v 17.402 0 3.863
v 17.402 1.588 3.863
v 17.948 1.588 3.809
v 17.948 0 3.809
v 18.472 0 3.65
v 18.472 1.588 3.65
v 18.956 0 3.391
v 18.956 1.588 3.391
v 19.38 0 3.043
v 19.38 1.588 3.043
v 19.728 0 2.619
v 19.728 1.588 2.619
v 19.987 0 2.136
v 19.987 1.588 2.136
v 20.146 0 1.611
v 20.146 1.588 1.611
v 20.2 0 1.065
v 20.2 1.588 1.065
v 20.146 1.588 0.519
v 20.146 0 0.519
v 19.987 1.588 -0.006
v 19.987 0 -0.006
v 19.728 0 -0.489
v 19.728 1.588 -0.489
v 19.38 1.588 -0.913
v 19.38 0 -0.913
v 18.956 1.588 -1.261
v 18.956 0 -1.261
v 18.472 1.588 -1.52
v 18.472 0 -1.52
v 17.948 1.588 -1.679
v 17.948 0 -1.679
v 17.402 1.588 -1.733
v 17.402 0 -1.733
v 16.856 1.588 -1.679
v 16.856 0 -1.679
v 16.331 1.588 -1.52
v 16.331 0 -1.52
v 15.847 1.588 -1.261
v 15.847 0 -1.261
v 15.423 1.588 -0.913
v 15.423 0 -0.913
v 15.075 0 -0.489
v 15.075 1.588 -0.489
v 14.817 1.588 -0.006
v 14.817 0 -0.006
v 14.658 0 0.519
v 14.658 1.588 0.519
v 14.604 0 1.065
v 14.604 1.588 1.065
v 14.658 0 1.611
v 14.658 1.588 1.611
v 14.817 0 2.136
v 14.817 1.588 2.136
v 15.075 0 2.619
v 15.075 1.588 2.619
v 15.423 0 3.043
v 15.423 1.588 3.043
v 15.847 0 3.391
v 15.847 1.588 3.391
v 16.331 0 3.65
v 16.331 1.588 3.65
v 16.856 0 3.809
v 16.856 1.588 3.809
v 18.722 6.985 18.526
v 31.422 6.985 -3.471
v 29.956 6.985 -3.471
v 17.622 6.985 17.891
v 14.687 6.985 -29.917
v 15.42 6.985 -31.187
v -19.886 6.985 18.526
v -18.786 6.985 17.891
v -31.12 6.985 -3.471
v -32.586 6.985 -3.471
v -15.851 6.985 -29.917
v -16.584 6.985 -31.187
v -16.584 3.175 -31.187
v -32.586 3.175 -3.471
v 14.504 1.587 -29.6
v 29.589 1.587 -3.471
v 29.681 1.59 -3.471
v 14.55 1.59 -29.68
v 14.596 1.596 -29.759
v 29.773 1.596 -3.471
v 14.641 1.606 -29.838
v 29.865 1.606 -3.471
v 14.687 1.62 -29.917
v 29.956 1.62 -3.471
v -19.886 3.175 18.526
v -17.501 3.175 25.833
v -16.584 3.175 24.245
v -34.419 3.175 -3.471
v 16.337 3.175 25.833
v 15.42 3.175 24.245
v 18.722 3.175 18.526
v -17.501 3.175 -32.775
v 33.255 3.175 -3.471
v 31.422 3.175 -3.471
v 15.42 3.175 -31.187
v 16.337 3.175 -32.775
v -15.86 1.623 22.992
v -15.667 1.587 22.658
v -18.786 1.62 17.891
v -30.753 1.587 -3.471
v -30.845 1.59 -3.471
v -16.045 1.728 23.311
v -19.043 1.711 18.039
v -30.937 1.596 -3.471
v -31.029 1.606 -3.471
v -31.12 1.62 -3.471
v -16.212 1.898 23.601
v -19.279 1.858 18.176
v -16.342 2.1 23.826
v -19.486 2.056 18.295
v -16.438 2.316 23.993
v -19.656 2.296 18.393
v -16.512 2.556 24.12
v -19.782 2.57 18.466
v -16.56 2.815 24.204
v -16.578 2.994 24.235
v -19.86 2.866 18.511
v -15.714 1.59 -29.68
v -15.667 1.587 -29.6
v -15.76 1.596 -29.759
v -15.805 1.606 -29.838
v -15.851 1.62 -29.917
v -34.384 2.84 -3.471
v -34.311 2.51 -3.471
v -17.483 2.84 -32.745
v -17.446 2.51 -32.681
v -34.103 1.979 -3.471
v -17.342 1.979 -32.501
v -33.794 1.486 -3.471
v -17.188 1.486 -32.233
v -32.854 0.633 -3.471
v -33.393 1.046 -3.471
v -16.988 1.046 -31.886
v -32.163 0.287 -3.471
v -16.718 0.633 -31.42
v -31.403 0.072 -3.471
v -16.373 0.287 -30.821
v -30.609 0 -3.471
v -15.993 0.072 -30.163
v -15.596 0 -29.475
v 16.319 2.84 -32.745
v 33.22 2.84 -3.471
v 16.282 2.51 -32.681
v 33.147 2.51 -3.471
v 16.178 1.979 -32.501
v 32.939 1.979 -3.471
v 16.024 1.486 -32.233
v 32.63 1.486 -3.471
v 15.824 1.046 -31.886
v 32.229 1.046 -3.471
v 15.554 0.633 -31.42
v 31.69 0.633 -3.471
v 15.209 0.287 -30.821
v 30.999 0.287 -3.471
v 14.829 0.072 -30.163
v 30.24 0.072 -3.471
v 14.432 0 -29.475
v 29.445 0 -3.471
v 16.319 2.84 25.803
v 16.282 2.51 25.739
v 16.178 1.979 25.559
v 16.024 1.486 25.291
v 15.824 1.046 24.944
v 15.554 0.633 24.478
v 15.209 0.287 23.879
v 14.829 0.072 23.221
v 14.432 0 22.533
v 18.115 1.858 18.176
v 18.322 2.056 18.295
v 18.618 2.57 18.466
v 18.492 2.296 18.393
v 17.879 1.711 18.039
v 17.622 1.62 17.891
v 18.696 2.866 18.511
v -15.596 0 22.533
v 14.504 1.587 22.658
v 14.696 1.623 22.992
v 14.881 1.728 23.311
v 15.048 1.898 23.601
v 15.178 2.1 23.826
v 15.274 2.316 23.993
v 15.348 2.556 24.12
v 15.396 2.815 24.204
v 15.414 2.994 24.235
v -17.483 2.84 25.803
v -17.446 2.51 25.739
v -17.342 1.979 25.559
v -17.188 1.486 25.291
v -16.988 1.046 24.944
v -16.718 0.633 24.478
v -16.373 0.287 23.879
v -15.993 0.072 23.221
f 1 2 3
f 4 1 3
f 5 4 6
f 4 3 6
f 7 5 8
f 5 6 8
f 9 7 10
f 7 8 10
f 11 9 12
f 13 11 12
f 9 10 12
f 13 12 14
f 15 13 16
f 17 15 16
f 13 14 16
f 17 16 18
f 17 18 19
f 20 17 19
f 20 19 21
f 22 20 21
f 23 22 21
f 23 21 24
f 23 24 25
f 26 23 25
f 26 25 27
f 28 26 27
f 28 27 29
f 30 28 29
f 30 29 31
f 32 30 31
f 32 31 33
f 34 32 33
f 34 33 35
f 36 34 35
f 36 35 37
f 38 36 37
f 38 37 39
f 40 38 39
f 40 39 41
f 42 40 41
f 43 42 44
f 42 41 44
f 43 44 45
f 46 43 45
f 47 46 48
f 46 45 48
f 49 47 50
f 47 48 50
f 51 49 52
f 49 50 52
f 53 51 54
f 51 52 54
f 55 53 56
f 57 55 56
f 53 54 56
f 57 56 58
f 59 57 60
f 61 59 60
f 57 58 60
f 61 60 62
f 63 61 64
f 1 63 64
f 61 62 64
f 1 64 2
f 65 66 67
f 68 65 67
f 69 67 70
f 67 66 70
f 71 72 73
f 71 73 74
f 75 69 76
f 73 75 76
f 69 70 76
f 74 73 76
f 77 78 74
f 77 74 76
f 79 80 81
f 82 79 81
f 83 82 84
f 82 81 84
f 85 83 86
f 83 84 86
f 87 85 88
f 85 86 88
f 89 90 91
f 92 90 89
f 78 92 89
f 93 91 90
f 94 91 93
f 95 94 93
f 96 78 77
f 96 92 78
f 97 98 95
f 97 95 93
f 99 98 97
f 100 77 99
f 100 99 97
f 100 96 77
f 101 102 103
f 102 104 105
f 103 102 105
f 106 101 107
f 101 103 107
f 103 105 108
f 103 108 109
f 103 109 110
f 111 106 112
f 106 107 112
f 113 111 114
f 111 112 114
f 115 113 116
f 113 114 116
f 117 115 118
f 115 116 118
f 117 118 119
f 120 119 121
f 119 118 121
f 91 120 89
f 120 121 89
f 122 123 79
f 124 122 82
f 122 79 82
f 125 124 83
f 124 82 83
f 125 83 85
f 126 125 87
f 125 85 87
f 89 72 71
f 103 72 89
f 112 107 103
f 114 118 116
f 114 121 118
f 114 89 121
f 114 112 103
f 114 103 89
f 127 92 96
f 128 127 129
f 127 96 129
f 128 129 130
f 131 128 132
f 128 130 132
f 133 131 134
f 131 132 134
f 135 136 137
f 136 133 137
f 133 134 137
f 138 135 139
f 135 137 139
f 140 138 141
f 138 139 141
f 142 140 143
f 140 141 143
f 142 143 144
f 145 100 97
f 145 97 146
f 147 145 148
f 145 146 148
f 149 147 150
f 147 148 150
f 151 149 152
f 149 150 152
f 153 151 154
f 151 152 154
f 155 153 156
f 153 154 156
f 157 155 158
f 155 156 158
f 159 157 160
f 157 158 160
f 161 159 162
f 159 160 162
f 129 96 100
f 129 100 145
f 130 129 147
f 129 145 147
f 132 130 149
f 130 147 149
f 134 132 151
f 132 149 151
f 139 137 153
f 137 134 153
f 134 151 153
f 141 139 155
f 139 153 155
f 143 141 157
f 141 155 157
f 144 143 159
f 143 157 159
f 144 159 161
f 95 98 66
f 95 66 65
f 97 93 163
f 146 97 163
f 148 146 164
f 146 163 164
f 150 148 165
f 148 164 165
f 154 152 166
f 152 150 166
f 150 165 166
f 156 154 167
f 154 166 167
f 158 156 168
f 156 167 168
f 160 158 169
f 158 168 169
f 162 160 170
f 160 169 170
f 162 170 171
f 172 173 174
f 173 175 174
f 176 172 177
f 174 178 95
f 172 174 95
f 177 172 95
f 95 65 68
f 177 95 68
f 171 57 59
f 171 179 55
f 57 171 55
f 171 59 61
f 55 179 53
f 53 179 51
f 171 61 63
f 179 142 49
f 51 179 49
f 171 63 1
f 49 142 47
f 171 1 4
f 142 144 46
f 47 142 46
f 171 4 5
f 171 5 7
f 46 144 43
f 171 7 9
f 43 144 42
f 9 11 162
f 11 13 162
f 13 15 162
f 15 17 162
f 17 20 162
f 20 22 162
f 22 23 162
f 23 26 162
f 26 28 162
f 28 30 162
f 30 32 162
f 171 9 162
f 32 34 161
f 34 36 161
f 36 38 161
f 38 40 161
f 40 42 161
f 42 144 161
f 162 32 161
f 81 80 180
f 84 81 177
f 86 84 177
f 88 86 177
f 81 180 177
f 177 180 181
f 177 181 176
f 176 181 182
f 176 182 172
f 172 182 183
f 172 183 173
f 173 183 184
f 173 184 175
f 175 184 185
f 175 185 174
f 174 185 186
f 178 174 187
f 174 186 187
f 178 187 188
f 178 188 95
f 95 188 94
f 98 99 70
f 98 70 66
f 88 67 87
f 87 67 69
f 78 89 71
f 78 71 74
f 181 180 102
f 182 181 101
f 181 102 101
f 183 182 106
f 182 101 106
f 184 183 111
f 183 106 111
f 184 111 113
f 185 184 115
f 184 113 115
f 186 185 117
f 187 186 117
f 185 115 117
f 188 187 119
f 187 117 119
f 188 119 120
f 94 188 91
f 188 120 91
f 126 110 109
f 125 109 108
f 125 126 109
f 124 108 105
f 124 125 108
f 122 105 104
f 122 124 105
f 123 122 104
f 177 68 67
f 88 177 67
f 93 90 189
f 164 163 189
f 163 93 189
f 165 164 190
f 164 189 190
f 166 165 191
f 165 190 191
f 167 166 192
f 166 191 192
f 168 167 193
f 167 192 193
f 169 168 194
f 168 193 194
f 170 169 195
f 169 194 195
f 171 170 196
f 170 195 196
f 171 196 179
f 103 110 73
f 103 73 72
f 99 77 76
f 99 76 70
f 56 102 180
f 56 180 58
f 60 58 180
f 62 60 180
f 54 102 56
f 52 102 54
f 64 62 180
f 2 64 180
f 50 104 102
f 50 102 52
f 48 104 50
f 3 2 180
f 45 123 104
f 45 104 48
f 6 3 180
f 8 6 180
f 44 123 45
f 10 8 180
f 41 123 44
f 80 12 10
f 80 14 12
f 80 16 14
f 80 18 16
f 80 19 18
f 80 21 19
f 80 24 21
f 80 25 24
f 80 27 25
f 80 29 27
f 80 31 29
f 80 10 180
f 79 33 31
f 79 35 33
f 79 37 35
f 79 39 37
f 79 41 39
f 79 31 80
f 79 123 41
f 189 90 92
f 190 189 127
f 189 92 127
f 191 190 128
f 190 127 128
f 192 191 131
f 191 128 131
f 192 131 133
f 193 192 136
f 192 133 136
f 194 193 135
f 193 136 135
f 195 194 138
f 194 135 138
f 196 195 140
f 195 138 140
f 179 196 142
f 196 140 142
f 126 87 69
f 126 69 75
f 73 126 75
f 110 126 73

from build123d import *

# Parameters (mm, degrees)
BOSS_EXTRUDE1_DEPTH             = 1.5875
BOSS_EXTRUDE2_DEPTH             = 1.5875
FILLET2_R                       = 1.5875
FILLET3_R                       = 3.302
BOSS_EXTRUDE3_DEPTH             = 3.81
BOSS_EXTRUDE3_DIRECTION_2_REACH = 49.633
SKETCH5_R                       = 2.797863207
CUT_EXTRUDE1_DEPTH              = 3.81


# Some blends are built 0.0001 mm under size
with BuildPart() as part:
    # Sketch1 → Boss-Extrude1 (new body)
    with BuildSketch(Plane(origin=(0, 0, 0), x_dir=(1, 0, 0), z_dir=(0, 1, 0))):
        Polygon((-34.41906837, 3.470841979), (-17.500524818, -25.832935043), (16.336562287, -25.832935043), (33.255105839, 3.470841979), (16.336562287, 32.774619002), (-17.500524818, 32.774619002), align=None)
    extrude(amount=BOSS_EXTRUDE1_DEPTH)

    # Sketch2 → Boss-Extrude2 (add)
    # profile 1 of 3: a face of its own
    with BuildSketch(Plane(origin=(0, 1.5875, 0), x_dir=(1, 0, 0), z_dir=(0, 1, 0))):
        Polygon((16.336562287, 32.774619002), (-17.500524818, 32.774619002), (-34.41906837, 3.470841979), (-17.500524818, -25.832935043), (16.336562287, -25.832935043), (33.255105839, 3.470841979), align=None)
        Polygon((-32.585981265, 3.470841979), (-16.583981265, 31.187119002), (15.420018735, 31.187119002), (31.422018735, 3.470841979), (15.420018735, -24.245435043), (-16.583981265, -24.245435043), align=None, mode=Mode.SUBTRACT)
    # profile 2 of 3: a face of its own
    with BuildSketch(Plane(origin=(0, 1.5875, 0), x_dir=(1, 0, 0), z_dir=(0, 1, 0))):
        Polygon((16.336562287, 32.774619002), (-17.500524818, 32.774619002), (-34.41906837, 3.470841979), (-17.500524818, -25.832935043), (16.336562287, -25.832935043), (33.255105839, 3.470841979), align=None)
        Polygon((-32.585981265, 3.470841979), (-16.583981265, 31.187119002), (15.420018735, 31.187119002), (31.422018735, 3.470841979), (15.420018735, -24.245435043), (-16.583981265, -24.245435043), align=None, mode=Mode.SUBTRACT)
    # profile 3 of 3: a face of its own
    with BuildSketch(Plane(origin=(0, 1.5875, 0), x_dir=(1, 0, 0), z_dir=(0, 1, 0))):
        Polygon((33.255105839, 3.470841979), (16.336562287, 32.774619002), (-17.500524818, 32.774619002), (-34.41906837, 3.470841979), (-17.500524818, -25.832935043), (16.336562287, -25.832935043), align=None)
        Polygon((-16.583981265, -24.245435043), (-32.585981265, 3.470841979), (-16.583981265, 31.187119002), (15.420018735, 31.187119002), (31.422018735, 3.470841979), (15.420018735, -24.245435043), align=None, mode=Mode.SUBTRACT)
    extrude(amount=BOSS_EXTRUDE2_DEPTH)

    # Fillet2
    fillet2_edges = [part.edges().sort_by_distance(p)[0] for p in [
        (23.421018735, 1.5875, -17.328980491),
        (23.421018735, 1.5875, 10.387296532),
        (-24.584981265, 1.5875, -17.328980491),
        (-0.581981265, 1.5875, 24.245435043),
        (-24.584981265, 1.5875, 10.387296532),
        (-0.581981265, 1.5875, -31.187119002),
    ]]
    fillet(fillet2_edges, radius=FILLET2_R - 0.0001)  # a hair under: the kernel refuses the full size

    # Fillet3
    # the kernel refuses this fillet: 3.302 mm, written as the material it takes off along each edge
    with BuildSketch(Plane(origin=(-25.749416789, 0, 25.832935043), x_dir=(0, 1, 0), z_dir=(1, 0, 0)), Plane(origin=(-38.543514355, 0, -10.614591979), x_dir=(0, 1, 0), z_dir=(0.4999999999999999, 0, 0.8660254037844387)), Plane(origin=(-13.376078832, 0, -39.918369002), x_dir=(0, 1, 0), z_dir=(-0.5000000000000002, 0, 0.8660254037844386)), Plane(origin=(24.585454258, 0, -32.774619002), x_dir=(0, 1, 0), z_dir=(-1, 0, 0)), Plane(origin=(12.212116302, 0, 32.976685043), x_dir=(0, 1, 0), z_dir=(0.5000000000000001, 0, -0.8660254037844387)), Plane(origin=(37.379551825, 0, 3.672908021), x_dir=(0, 1, 0), z_dir=(-0.5, 0, -0.8660254037844387))) as fillet3_piece_1:
        with BuildLine():
            CenterArc((3.302, -3.299556788), FILLET3_R, 92.204227504, 87.795772496)
            Line((0, -3.299556788), (-0.06604, -3.299556788))
            Line((-0.06604, -3.299556788), (-0.06604, 0))
            Line((-0.06604, 0), (0, 0.06604))
            ThreePointArc((0, 0.06604), (1.5875, 0.06604), (3.17246, 0.065991136))
            Line((3.17246, 0.065991136), (3.175, 0))
        make_face()
    extrude(amount=50.334871047, mode=Mode.SUBTRACT)

    # Sketch4 → Boss-Extrude3 (add)
    with BuildSketch(Plane(origin=(0, 3.175, 0), x_dir=(1, 0, 0), z_dir=(0, 1, 0))):
        Polygon((-32.585981265, 3.470841979), (-16.583981265, 31.187119002), (15.420018735, 31.187119002), (31.422018735, 3.470841979), (18.722018735, -18.526203277), (17.622166472, -17.891203277), (29.955549051, 3.470841979), (14.686783893, 29.917119002), (-15.850746423, 29.917119002), (-31.119511582, 3.470841979), (-18.786129002, -17.891203277), (-19.885981265, -18.526203277), align=None)
    extrude(amount=BOSS_EXTRUDE3_DEPTH)

    # Sketch4 → Boss-Extrude3 direction 2 (add, up to next)
    with BuildSketch(Plane(origin=(0, 3.175, 0), x_dir=(1, 0, 0), z_dir=(0, 1, 0)), mode=Mode.PRIVATE) as boss_extrude3_direction_2_sk1:
        Polygon((-32.585981265, 3.470841979), (-16.583981265, 31.187119002), (15.420018735, 31.187119002), (31.422018735, 3.470841979), (18.722018735, -18.526203277), (17.622166472, -17.891203277), (29.955549051, 3.470841979), (14.686783893, 29.917119002), (-15.850746423, 29.917119002), (-31.119511582, 3.470841979), (-18.786129002, -17.891203277), (-19.885981265, -18.526203277), align=None)
    boss_extrude3_direction_2_tool1 = extrude(boss_extrude3_direction_2_sk1.sketch, amount=-BOSS_EXTRUDE3_DIRECTION_2_REACH, mode=Mode.PRIVATE) - part.part
    add(boss_extrude3_direction_2_tool1.solids().sort_by_distance((-23.883103, 3.175, -16.923751))[0])

    # Sketch5 → Cut-Extrude1 (cut)
    with BuildSketch(Plane(origin=(0, 1.5875, 0), x_dir=(1, 0, 0), z_dir=(0, 1, 0))):
        with Locations(Location((17.401743672, -1.065074689, 0), (0, 0, 270))):
            Circle(SKETCH5_R)
    extrude(amount=-CUT_EXTRUDE1_DEPTH, mode=Mode.SUBTRACT)


solid = part.part
